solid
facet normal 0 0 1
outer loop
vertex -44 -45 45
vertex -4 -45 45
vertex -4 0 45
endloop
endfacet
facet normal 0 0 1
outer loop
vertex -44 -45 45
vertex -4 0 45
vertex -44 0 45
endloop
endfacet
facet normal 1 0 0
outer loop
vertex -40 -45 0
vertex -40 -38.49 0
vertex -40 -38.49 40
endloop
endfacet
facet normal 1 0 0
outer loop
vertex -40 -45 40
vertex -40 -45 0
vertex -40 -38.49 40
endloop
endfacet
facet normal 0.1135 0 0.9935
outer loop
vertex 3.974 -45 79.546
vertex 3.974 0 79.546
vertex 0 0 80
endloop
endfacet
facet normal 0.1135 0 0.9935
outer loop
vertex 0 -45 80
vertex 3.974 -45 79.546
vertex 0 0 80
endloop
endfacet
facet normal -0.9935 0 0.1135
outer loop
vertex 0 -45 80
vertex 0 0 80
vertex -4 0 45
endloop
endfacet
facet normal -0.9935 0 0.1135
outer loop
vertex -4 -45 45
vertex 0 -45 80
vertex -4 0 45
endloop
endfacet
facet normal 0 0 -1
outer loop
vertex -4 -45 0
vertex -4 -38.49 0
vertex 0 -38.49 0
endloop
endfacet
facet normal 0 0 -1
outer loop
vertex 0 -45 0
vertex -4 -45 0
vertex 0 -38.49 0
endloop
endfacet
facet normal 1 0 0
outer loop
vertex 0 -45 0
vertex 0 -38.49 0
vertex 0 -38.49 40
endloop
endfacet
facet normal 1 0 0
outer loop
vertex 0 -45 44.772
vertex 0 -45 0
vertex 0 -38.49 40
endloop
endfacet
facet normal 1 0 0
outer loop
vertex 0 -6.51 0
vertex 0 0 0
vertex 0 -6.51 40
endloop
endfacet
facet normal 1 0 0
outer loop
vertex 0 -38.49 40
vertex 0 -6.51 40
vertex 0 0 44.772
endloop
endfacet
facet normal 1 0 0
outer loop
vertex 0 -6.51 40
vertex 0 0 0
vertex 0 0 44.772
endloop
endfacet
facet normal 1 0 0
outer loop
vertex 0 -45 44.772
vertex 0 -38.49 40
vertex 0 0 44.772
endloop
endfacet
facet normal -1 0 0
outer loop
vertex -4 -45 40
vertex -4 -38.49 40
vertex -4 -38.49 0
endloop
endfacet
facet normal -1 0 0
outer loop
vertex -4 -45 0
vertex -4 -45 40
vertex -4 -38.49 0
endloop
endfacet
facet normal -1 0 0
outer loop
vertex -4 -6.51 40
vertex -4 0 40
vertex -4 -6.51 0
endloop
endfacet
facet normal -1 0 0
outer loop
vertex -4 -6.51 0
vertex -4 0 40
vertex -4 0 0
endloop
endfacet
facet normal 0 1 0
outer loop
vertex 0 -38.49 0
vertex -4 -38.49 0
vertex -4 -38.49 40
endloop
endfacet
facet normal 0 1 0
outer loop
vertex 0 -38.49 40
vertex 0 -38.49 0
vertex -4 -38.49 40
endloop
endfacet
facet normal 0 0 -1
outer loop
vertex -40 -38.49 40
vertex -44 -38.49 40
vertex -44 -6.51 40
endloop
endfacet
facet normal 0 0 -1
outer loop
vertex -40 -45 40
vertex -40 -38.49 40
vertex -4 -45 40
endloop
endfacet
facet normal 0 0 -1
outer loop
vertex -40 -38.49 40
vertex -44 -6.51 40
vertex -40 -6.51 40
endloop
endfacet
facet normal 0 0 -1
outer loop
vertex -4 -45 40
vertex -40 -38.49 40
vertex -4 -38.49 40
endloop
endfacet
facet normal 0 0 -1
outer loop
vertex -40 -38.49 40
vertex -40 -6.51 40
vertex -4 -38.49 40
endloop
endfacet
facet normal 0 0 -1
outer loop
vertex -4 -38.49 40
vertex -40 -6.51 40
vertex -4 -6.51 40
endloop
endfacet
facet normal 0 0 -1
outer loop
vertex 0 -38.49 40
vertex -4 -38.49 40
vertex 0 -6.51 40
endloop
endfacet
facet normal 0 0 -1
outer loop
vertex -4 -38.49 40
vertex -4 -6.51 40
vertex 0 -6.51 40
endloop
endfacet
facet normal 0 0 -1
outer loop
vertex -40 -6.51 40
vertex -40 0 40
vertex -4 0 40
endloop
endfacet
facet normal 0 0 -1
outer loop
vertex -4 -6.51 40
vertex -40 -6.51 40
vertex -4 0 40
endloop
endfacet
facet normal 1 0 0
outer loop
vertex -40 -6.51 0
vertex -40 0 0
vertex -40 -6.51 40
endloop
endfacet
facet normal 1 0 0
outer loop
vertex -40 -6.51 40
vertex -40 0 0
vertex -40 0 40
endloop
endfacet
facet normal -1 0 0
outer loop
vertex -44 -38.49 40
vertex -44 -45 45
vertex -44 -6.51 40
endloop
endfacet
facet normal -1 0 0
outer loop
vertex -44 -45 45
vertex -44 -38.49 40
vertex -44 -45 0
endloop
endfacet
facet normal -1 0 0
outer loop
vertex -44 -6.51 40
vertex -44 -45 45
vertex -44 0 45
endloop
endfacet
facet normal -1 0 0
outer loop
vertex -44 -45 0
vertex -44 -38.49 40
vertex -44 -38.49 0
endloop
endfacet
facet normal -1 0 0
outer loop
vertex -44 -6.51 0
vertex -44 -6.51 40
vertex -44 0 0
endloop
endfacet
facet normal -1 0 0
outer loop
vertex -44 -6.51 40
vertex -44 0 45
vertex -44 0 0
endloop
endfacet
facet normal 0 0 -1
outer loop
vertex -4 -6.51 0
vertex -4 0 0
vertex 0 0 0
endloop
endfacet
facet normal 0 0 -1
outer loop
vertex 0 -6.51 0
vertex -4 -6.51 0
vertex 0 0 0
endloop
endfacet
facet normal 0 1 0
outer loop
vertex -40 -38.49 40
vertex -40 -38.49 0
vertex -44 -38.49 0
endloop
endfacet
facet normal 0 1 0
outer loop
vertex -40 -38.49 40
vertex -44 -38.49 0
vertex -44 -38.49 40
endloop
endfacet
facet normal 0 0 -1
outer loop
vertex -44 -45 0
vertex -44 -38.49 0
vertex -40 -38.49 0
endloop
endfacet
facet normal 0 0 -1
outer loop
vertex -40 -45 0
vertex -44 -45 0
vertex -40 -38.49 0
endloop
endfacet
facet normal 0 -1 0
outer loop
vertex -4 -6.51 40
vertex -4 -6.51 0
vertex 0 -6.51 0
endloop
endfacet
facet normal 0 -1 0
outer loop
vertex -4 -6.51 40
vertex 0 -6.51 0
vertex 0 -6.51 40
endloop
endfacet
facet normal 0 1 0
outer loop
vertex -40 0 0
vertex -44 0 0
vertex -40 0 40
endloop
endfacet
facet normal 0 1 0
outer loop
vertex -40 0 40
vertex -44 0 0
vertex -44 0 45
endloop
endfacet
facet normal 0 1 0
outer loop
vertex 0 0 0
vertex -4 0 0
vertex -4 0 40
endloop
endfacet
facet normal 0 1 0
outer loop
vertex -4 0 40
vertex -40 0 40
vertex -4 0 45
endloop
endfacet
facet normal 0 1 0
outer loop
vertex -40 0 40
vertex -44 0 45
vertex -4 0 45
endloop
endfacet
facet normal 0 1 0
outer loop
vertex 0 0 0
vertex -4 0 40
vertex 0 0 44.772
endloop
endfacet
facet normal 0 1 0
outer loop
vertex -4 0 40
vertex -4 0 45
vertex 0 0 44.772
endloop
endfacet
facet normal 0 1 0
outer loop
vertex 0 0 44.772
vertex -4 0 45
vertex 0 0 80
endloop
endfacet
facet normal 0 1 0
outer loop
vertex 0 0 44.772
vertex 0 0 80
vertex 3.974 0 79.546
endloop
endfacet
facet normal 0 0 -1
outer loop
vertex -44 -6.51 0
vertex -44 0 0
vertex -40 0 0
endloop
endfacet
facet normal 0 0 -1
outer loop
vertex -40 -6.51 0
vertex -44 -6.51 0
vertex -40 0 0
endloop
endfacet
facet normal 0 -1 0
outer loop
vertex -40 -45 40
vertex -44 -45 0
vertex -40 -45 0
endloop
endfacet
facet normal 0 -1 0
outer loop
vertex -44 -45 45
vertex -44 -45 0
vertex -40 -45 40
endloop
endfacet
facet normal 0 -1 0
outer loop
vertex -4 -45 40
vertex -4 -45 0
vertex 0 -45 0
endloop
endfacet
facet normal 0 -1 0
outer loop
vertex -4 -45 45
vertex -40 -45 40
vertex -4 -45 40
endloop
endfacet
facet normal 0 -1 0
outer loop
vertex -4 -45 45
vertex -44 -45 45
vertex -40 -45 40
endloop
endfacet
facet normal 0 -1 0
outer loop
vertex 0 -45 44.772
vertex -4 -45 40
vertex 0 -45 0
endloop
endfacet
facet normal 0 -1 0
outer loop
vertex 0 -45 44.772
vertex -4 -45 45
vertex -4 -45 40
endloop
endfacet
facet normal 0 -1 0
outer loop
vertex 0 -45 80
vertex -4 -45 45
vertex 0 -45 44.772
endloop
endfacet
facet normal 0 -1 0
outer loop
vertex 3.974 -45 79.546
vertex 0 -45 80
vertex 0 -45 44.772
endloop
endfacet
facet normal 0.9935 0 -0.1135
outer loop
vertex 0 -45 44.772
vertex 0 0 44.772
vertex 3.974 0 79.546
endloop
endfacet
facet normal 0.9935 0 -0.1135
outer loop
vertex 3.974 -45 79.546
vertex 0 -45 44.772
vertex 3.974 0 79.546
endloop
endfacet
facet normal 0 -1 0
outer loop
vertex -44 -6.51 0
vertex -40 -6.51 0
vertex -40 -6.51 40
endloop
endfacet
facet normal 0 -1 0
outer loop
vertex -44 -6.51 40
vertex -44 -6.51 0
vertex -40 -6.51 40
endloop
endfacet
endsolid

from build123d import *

# Parameters (mm, degrees)
F1_DEPTH      = 45
F2_W          = 31.9801214337
F2_H          = 40
F3_DEPTH      = 7.9751306906
F3_DEPTH_BACK = 40.001


with BuildPart() as f1:
    # F0 (on Front) → F1 (new body)
    with BuildSketch(Plane.XZ):
        Polygon((-4, 0), (0, 0), (0, 44.7721700924), (3.9741306906, 79.5458136354), (0, 80), (-4, 45), (-44, 45), (-44, 0), (-40, 0), (-40, 40), (-4, 40), align=None)
    extrude(amount=F1_DEPTH)

    # F2 (on face) → F3 (cut, two sides)
    with BuildSketch(Plane(origin=(-4, 0, 0), x_dir=(0, -1, 0), z_dir=(-1, 0, 0))) as f3_sk:
        with Locations((22.5, 20)):
            Rectangle(F2_W, F2_H)
    extrude(amount=-F3_DEPTH, mode=Mode.SUBTRACT)
    extrude(f3_sk.sketch, amount=F3_DEPTH_BACK, mode=Mode.SUBTRACT)


solid = f1.part
